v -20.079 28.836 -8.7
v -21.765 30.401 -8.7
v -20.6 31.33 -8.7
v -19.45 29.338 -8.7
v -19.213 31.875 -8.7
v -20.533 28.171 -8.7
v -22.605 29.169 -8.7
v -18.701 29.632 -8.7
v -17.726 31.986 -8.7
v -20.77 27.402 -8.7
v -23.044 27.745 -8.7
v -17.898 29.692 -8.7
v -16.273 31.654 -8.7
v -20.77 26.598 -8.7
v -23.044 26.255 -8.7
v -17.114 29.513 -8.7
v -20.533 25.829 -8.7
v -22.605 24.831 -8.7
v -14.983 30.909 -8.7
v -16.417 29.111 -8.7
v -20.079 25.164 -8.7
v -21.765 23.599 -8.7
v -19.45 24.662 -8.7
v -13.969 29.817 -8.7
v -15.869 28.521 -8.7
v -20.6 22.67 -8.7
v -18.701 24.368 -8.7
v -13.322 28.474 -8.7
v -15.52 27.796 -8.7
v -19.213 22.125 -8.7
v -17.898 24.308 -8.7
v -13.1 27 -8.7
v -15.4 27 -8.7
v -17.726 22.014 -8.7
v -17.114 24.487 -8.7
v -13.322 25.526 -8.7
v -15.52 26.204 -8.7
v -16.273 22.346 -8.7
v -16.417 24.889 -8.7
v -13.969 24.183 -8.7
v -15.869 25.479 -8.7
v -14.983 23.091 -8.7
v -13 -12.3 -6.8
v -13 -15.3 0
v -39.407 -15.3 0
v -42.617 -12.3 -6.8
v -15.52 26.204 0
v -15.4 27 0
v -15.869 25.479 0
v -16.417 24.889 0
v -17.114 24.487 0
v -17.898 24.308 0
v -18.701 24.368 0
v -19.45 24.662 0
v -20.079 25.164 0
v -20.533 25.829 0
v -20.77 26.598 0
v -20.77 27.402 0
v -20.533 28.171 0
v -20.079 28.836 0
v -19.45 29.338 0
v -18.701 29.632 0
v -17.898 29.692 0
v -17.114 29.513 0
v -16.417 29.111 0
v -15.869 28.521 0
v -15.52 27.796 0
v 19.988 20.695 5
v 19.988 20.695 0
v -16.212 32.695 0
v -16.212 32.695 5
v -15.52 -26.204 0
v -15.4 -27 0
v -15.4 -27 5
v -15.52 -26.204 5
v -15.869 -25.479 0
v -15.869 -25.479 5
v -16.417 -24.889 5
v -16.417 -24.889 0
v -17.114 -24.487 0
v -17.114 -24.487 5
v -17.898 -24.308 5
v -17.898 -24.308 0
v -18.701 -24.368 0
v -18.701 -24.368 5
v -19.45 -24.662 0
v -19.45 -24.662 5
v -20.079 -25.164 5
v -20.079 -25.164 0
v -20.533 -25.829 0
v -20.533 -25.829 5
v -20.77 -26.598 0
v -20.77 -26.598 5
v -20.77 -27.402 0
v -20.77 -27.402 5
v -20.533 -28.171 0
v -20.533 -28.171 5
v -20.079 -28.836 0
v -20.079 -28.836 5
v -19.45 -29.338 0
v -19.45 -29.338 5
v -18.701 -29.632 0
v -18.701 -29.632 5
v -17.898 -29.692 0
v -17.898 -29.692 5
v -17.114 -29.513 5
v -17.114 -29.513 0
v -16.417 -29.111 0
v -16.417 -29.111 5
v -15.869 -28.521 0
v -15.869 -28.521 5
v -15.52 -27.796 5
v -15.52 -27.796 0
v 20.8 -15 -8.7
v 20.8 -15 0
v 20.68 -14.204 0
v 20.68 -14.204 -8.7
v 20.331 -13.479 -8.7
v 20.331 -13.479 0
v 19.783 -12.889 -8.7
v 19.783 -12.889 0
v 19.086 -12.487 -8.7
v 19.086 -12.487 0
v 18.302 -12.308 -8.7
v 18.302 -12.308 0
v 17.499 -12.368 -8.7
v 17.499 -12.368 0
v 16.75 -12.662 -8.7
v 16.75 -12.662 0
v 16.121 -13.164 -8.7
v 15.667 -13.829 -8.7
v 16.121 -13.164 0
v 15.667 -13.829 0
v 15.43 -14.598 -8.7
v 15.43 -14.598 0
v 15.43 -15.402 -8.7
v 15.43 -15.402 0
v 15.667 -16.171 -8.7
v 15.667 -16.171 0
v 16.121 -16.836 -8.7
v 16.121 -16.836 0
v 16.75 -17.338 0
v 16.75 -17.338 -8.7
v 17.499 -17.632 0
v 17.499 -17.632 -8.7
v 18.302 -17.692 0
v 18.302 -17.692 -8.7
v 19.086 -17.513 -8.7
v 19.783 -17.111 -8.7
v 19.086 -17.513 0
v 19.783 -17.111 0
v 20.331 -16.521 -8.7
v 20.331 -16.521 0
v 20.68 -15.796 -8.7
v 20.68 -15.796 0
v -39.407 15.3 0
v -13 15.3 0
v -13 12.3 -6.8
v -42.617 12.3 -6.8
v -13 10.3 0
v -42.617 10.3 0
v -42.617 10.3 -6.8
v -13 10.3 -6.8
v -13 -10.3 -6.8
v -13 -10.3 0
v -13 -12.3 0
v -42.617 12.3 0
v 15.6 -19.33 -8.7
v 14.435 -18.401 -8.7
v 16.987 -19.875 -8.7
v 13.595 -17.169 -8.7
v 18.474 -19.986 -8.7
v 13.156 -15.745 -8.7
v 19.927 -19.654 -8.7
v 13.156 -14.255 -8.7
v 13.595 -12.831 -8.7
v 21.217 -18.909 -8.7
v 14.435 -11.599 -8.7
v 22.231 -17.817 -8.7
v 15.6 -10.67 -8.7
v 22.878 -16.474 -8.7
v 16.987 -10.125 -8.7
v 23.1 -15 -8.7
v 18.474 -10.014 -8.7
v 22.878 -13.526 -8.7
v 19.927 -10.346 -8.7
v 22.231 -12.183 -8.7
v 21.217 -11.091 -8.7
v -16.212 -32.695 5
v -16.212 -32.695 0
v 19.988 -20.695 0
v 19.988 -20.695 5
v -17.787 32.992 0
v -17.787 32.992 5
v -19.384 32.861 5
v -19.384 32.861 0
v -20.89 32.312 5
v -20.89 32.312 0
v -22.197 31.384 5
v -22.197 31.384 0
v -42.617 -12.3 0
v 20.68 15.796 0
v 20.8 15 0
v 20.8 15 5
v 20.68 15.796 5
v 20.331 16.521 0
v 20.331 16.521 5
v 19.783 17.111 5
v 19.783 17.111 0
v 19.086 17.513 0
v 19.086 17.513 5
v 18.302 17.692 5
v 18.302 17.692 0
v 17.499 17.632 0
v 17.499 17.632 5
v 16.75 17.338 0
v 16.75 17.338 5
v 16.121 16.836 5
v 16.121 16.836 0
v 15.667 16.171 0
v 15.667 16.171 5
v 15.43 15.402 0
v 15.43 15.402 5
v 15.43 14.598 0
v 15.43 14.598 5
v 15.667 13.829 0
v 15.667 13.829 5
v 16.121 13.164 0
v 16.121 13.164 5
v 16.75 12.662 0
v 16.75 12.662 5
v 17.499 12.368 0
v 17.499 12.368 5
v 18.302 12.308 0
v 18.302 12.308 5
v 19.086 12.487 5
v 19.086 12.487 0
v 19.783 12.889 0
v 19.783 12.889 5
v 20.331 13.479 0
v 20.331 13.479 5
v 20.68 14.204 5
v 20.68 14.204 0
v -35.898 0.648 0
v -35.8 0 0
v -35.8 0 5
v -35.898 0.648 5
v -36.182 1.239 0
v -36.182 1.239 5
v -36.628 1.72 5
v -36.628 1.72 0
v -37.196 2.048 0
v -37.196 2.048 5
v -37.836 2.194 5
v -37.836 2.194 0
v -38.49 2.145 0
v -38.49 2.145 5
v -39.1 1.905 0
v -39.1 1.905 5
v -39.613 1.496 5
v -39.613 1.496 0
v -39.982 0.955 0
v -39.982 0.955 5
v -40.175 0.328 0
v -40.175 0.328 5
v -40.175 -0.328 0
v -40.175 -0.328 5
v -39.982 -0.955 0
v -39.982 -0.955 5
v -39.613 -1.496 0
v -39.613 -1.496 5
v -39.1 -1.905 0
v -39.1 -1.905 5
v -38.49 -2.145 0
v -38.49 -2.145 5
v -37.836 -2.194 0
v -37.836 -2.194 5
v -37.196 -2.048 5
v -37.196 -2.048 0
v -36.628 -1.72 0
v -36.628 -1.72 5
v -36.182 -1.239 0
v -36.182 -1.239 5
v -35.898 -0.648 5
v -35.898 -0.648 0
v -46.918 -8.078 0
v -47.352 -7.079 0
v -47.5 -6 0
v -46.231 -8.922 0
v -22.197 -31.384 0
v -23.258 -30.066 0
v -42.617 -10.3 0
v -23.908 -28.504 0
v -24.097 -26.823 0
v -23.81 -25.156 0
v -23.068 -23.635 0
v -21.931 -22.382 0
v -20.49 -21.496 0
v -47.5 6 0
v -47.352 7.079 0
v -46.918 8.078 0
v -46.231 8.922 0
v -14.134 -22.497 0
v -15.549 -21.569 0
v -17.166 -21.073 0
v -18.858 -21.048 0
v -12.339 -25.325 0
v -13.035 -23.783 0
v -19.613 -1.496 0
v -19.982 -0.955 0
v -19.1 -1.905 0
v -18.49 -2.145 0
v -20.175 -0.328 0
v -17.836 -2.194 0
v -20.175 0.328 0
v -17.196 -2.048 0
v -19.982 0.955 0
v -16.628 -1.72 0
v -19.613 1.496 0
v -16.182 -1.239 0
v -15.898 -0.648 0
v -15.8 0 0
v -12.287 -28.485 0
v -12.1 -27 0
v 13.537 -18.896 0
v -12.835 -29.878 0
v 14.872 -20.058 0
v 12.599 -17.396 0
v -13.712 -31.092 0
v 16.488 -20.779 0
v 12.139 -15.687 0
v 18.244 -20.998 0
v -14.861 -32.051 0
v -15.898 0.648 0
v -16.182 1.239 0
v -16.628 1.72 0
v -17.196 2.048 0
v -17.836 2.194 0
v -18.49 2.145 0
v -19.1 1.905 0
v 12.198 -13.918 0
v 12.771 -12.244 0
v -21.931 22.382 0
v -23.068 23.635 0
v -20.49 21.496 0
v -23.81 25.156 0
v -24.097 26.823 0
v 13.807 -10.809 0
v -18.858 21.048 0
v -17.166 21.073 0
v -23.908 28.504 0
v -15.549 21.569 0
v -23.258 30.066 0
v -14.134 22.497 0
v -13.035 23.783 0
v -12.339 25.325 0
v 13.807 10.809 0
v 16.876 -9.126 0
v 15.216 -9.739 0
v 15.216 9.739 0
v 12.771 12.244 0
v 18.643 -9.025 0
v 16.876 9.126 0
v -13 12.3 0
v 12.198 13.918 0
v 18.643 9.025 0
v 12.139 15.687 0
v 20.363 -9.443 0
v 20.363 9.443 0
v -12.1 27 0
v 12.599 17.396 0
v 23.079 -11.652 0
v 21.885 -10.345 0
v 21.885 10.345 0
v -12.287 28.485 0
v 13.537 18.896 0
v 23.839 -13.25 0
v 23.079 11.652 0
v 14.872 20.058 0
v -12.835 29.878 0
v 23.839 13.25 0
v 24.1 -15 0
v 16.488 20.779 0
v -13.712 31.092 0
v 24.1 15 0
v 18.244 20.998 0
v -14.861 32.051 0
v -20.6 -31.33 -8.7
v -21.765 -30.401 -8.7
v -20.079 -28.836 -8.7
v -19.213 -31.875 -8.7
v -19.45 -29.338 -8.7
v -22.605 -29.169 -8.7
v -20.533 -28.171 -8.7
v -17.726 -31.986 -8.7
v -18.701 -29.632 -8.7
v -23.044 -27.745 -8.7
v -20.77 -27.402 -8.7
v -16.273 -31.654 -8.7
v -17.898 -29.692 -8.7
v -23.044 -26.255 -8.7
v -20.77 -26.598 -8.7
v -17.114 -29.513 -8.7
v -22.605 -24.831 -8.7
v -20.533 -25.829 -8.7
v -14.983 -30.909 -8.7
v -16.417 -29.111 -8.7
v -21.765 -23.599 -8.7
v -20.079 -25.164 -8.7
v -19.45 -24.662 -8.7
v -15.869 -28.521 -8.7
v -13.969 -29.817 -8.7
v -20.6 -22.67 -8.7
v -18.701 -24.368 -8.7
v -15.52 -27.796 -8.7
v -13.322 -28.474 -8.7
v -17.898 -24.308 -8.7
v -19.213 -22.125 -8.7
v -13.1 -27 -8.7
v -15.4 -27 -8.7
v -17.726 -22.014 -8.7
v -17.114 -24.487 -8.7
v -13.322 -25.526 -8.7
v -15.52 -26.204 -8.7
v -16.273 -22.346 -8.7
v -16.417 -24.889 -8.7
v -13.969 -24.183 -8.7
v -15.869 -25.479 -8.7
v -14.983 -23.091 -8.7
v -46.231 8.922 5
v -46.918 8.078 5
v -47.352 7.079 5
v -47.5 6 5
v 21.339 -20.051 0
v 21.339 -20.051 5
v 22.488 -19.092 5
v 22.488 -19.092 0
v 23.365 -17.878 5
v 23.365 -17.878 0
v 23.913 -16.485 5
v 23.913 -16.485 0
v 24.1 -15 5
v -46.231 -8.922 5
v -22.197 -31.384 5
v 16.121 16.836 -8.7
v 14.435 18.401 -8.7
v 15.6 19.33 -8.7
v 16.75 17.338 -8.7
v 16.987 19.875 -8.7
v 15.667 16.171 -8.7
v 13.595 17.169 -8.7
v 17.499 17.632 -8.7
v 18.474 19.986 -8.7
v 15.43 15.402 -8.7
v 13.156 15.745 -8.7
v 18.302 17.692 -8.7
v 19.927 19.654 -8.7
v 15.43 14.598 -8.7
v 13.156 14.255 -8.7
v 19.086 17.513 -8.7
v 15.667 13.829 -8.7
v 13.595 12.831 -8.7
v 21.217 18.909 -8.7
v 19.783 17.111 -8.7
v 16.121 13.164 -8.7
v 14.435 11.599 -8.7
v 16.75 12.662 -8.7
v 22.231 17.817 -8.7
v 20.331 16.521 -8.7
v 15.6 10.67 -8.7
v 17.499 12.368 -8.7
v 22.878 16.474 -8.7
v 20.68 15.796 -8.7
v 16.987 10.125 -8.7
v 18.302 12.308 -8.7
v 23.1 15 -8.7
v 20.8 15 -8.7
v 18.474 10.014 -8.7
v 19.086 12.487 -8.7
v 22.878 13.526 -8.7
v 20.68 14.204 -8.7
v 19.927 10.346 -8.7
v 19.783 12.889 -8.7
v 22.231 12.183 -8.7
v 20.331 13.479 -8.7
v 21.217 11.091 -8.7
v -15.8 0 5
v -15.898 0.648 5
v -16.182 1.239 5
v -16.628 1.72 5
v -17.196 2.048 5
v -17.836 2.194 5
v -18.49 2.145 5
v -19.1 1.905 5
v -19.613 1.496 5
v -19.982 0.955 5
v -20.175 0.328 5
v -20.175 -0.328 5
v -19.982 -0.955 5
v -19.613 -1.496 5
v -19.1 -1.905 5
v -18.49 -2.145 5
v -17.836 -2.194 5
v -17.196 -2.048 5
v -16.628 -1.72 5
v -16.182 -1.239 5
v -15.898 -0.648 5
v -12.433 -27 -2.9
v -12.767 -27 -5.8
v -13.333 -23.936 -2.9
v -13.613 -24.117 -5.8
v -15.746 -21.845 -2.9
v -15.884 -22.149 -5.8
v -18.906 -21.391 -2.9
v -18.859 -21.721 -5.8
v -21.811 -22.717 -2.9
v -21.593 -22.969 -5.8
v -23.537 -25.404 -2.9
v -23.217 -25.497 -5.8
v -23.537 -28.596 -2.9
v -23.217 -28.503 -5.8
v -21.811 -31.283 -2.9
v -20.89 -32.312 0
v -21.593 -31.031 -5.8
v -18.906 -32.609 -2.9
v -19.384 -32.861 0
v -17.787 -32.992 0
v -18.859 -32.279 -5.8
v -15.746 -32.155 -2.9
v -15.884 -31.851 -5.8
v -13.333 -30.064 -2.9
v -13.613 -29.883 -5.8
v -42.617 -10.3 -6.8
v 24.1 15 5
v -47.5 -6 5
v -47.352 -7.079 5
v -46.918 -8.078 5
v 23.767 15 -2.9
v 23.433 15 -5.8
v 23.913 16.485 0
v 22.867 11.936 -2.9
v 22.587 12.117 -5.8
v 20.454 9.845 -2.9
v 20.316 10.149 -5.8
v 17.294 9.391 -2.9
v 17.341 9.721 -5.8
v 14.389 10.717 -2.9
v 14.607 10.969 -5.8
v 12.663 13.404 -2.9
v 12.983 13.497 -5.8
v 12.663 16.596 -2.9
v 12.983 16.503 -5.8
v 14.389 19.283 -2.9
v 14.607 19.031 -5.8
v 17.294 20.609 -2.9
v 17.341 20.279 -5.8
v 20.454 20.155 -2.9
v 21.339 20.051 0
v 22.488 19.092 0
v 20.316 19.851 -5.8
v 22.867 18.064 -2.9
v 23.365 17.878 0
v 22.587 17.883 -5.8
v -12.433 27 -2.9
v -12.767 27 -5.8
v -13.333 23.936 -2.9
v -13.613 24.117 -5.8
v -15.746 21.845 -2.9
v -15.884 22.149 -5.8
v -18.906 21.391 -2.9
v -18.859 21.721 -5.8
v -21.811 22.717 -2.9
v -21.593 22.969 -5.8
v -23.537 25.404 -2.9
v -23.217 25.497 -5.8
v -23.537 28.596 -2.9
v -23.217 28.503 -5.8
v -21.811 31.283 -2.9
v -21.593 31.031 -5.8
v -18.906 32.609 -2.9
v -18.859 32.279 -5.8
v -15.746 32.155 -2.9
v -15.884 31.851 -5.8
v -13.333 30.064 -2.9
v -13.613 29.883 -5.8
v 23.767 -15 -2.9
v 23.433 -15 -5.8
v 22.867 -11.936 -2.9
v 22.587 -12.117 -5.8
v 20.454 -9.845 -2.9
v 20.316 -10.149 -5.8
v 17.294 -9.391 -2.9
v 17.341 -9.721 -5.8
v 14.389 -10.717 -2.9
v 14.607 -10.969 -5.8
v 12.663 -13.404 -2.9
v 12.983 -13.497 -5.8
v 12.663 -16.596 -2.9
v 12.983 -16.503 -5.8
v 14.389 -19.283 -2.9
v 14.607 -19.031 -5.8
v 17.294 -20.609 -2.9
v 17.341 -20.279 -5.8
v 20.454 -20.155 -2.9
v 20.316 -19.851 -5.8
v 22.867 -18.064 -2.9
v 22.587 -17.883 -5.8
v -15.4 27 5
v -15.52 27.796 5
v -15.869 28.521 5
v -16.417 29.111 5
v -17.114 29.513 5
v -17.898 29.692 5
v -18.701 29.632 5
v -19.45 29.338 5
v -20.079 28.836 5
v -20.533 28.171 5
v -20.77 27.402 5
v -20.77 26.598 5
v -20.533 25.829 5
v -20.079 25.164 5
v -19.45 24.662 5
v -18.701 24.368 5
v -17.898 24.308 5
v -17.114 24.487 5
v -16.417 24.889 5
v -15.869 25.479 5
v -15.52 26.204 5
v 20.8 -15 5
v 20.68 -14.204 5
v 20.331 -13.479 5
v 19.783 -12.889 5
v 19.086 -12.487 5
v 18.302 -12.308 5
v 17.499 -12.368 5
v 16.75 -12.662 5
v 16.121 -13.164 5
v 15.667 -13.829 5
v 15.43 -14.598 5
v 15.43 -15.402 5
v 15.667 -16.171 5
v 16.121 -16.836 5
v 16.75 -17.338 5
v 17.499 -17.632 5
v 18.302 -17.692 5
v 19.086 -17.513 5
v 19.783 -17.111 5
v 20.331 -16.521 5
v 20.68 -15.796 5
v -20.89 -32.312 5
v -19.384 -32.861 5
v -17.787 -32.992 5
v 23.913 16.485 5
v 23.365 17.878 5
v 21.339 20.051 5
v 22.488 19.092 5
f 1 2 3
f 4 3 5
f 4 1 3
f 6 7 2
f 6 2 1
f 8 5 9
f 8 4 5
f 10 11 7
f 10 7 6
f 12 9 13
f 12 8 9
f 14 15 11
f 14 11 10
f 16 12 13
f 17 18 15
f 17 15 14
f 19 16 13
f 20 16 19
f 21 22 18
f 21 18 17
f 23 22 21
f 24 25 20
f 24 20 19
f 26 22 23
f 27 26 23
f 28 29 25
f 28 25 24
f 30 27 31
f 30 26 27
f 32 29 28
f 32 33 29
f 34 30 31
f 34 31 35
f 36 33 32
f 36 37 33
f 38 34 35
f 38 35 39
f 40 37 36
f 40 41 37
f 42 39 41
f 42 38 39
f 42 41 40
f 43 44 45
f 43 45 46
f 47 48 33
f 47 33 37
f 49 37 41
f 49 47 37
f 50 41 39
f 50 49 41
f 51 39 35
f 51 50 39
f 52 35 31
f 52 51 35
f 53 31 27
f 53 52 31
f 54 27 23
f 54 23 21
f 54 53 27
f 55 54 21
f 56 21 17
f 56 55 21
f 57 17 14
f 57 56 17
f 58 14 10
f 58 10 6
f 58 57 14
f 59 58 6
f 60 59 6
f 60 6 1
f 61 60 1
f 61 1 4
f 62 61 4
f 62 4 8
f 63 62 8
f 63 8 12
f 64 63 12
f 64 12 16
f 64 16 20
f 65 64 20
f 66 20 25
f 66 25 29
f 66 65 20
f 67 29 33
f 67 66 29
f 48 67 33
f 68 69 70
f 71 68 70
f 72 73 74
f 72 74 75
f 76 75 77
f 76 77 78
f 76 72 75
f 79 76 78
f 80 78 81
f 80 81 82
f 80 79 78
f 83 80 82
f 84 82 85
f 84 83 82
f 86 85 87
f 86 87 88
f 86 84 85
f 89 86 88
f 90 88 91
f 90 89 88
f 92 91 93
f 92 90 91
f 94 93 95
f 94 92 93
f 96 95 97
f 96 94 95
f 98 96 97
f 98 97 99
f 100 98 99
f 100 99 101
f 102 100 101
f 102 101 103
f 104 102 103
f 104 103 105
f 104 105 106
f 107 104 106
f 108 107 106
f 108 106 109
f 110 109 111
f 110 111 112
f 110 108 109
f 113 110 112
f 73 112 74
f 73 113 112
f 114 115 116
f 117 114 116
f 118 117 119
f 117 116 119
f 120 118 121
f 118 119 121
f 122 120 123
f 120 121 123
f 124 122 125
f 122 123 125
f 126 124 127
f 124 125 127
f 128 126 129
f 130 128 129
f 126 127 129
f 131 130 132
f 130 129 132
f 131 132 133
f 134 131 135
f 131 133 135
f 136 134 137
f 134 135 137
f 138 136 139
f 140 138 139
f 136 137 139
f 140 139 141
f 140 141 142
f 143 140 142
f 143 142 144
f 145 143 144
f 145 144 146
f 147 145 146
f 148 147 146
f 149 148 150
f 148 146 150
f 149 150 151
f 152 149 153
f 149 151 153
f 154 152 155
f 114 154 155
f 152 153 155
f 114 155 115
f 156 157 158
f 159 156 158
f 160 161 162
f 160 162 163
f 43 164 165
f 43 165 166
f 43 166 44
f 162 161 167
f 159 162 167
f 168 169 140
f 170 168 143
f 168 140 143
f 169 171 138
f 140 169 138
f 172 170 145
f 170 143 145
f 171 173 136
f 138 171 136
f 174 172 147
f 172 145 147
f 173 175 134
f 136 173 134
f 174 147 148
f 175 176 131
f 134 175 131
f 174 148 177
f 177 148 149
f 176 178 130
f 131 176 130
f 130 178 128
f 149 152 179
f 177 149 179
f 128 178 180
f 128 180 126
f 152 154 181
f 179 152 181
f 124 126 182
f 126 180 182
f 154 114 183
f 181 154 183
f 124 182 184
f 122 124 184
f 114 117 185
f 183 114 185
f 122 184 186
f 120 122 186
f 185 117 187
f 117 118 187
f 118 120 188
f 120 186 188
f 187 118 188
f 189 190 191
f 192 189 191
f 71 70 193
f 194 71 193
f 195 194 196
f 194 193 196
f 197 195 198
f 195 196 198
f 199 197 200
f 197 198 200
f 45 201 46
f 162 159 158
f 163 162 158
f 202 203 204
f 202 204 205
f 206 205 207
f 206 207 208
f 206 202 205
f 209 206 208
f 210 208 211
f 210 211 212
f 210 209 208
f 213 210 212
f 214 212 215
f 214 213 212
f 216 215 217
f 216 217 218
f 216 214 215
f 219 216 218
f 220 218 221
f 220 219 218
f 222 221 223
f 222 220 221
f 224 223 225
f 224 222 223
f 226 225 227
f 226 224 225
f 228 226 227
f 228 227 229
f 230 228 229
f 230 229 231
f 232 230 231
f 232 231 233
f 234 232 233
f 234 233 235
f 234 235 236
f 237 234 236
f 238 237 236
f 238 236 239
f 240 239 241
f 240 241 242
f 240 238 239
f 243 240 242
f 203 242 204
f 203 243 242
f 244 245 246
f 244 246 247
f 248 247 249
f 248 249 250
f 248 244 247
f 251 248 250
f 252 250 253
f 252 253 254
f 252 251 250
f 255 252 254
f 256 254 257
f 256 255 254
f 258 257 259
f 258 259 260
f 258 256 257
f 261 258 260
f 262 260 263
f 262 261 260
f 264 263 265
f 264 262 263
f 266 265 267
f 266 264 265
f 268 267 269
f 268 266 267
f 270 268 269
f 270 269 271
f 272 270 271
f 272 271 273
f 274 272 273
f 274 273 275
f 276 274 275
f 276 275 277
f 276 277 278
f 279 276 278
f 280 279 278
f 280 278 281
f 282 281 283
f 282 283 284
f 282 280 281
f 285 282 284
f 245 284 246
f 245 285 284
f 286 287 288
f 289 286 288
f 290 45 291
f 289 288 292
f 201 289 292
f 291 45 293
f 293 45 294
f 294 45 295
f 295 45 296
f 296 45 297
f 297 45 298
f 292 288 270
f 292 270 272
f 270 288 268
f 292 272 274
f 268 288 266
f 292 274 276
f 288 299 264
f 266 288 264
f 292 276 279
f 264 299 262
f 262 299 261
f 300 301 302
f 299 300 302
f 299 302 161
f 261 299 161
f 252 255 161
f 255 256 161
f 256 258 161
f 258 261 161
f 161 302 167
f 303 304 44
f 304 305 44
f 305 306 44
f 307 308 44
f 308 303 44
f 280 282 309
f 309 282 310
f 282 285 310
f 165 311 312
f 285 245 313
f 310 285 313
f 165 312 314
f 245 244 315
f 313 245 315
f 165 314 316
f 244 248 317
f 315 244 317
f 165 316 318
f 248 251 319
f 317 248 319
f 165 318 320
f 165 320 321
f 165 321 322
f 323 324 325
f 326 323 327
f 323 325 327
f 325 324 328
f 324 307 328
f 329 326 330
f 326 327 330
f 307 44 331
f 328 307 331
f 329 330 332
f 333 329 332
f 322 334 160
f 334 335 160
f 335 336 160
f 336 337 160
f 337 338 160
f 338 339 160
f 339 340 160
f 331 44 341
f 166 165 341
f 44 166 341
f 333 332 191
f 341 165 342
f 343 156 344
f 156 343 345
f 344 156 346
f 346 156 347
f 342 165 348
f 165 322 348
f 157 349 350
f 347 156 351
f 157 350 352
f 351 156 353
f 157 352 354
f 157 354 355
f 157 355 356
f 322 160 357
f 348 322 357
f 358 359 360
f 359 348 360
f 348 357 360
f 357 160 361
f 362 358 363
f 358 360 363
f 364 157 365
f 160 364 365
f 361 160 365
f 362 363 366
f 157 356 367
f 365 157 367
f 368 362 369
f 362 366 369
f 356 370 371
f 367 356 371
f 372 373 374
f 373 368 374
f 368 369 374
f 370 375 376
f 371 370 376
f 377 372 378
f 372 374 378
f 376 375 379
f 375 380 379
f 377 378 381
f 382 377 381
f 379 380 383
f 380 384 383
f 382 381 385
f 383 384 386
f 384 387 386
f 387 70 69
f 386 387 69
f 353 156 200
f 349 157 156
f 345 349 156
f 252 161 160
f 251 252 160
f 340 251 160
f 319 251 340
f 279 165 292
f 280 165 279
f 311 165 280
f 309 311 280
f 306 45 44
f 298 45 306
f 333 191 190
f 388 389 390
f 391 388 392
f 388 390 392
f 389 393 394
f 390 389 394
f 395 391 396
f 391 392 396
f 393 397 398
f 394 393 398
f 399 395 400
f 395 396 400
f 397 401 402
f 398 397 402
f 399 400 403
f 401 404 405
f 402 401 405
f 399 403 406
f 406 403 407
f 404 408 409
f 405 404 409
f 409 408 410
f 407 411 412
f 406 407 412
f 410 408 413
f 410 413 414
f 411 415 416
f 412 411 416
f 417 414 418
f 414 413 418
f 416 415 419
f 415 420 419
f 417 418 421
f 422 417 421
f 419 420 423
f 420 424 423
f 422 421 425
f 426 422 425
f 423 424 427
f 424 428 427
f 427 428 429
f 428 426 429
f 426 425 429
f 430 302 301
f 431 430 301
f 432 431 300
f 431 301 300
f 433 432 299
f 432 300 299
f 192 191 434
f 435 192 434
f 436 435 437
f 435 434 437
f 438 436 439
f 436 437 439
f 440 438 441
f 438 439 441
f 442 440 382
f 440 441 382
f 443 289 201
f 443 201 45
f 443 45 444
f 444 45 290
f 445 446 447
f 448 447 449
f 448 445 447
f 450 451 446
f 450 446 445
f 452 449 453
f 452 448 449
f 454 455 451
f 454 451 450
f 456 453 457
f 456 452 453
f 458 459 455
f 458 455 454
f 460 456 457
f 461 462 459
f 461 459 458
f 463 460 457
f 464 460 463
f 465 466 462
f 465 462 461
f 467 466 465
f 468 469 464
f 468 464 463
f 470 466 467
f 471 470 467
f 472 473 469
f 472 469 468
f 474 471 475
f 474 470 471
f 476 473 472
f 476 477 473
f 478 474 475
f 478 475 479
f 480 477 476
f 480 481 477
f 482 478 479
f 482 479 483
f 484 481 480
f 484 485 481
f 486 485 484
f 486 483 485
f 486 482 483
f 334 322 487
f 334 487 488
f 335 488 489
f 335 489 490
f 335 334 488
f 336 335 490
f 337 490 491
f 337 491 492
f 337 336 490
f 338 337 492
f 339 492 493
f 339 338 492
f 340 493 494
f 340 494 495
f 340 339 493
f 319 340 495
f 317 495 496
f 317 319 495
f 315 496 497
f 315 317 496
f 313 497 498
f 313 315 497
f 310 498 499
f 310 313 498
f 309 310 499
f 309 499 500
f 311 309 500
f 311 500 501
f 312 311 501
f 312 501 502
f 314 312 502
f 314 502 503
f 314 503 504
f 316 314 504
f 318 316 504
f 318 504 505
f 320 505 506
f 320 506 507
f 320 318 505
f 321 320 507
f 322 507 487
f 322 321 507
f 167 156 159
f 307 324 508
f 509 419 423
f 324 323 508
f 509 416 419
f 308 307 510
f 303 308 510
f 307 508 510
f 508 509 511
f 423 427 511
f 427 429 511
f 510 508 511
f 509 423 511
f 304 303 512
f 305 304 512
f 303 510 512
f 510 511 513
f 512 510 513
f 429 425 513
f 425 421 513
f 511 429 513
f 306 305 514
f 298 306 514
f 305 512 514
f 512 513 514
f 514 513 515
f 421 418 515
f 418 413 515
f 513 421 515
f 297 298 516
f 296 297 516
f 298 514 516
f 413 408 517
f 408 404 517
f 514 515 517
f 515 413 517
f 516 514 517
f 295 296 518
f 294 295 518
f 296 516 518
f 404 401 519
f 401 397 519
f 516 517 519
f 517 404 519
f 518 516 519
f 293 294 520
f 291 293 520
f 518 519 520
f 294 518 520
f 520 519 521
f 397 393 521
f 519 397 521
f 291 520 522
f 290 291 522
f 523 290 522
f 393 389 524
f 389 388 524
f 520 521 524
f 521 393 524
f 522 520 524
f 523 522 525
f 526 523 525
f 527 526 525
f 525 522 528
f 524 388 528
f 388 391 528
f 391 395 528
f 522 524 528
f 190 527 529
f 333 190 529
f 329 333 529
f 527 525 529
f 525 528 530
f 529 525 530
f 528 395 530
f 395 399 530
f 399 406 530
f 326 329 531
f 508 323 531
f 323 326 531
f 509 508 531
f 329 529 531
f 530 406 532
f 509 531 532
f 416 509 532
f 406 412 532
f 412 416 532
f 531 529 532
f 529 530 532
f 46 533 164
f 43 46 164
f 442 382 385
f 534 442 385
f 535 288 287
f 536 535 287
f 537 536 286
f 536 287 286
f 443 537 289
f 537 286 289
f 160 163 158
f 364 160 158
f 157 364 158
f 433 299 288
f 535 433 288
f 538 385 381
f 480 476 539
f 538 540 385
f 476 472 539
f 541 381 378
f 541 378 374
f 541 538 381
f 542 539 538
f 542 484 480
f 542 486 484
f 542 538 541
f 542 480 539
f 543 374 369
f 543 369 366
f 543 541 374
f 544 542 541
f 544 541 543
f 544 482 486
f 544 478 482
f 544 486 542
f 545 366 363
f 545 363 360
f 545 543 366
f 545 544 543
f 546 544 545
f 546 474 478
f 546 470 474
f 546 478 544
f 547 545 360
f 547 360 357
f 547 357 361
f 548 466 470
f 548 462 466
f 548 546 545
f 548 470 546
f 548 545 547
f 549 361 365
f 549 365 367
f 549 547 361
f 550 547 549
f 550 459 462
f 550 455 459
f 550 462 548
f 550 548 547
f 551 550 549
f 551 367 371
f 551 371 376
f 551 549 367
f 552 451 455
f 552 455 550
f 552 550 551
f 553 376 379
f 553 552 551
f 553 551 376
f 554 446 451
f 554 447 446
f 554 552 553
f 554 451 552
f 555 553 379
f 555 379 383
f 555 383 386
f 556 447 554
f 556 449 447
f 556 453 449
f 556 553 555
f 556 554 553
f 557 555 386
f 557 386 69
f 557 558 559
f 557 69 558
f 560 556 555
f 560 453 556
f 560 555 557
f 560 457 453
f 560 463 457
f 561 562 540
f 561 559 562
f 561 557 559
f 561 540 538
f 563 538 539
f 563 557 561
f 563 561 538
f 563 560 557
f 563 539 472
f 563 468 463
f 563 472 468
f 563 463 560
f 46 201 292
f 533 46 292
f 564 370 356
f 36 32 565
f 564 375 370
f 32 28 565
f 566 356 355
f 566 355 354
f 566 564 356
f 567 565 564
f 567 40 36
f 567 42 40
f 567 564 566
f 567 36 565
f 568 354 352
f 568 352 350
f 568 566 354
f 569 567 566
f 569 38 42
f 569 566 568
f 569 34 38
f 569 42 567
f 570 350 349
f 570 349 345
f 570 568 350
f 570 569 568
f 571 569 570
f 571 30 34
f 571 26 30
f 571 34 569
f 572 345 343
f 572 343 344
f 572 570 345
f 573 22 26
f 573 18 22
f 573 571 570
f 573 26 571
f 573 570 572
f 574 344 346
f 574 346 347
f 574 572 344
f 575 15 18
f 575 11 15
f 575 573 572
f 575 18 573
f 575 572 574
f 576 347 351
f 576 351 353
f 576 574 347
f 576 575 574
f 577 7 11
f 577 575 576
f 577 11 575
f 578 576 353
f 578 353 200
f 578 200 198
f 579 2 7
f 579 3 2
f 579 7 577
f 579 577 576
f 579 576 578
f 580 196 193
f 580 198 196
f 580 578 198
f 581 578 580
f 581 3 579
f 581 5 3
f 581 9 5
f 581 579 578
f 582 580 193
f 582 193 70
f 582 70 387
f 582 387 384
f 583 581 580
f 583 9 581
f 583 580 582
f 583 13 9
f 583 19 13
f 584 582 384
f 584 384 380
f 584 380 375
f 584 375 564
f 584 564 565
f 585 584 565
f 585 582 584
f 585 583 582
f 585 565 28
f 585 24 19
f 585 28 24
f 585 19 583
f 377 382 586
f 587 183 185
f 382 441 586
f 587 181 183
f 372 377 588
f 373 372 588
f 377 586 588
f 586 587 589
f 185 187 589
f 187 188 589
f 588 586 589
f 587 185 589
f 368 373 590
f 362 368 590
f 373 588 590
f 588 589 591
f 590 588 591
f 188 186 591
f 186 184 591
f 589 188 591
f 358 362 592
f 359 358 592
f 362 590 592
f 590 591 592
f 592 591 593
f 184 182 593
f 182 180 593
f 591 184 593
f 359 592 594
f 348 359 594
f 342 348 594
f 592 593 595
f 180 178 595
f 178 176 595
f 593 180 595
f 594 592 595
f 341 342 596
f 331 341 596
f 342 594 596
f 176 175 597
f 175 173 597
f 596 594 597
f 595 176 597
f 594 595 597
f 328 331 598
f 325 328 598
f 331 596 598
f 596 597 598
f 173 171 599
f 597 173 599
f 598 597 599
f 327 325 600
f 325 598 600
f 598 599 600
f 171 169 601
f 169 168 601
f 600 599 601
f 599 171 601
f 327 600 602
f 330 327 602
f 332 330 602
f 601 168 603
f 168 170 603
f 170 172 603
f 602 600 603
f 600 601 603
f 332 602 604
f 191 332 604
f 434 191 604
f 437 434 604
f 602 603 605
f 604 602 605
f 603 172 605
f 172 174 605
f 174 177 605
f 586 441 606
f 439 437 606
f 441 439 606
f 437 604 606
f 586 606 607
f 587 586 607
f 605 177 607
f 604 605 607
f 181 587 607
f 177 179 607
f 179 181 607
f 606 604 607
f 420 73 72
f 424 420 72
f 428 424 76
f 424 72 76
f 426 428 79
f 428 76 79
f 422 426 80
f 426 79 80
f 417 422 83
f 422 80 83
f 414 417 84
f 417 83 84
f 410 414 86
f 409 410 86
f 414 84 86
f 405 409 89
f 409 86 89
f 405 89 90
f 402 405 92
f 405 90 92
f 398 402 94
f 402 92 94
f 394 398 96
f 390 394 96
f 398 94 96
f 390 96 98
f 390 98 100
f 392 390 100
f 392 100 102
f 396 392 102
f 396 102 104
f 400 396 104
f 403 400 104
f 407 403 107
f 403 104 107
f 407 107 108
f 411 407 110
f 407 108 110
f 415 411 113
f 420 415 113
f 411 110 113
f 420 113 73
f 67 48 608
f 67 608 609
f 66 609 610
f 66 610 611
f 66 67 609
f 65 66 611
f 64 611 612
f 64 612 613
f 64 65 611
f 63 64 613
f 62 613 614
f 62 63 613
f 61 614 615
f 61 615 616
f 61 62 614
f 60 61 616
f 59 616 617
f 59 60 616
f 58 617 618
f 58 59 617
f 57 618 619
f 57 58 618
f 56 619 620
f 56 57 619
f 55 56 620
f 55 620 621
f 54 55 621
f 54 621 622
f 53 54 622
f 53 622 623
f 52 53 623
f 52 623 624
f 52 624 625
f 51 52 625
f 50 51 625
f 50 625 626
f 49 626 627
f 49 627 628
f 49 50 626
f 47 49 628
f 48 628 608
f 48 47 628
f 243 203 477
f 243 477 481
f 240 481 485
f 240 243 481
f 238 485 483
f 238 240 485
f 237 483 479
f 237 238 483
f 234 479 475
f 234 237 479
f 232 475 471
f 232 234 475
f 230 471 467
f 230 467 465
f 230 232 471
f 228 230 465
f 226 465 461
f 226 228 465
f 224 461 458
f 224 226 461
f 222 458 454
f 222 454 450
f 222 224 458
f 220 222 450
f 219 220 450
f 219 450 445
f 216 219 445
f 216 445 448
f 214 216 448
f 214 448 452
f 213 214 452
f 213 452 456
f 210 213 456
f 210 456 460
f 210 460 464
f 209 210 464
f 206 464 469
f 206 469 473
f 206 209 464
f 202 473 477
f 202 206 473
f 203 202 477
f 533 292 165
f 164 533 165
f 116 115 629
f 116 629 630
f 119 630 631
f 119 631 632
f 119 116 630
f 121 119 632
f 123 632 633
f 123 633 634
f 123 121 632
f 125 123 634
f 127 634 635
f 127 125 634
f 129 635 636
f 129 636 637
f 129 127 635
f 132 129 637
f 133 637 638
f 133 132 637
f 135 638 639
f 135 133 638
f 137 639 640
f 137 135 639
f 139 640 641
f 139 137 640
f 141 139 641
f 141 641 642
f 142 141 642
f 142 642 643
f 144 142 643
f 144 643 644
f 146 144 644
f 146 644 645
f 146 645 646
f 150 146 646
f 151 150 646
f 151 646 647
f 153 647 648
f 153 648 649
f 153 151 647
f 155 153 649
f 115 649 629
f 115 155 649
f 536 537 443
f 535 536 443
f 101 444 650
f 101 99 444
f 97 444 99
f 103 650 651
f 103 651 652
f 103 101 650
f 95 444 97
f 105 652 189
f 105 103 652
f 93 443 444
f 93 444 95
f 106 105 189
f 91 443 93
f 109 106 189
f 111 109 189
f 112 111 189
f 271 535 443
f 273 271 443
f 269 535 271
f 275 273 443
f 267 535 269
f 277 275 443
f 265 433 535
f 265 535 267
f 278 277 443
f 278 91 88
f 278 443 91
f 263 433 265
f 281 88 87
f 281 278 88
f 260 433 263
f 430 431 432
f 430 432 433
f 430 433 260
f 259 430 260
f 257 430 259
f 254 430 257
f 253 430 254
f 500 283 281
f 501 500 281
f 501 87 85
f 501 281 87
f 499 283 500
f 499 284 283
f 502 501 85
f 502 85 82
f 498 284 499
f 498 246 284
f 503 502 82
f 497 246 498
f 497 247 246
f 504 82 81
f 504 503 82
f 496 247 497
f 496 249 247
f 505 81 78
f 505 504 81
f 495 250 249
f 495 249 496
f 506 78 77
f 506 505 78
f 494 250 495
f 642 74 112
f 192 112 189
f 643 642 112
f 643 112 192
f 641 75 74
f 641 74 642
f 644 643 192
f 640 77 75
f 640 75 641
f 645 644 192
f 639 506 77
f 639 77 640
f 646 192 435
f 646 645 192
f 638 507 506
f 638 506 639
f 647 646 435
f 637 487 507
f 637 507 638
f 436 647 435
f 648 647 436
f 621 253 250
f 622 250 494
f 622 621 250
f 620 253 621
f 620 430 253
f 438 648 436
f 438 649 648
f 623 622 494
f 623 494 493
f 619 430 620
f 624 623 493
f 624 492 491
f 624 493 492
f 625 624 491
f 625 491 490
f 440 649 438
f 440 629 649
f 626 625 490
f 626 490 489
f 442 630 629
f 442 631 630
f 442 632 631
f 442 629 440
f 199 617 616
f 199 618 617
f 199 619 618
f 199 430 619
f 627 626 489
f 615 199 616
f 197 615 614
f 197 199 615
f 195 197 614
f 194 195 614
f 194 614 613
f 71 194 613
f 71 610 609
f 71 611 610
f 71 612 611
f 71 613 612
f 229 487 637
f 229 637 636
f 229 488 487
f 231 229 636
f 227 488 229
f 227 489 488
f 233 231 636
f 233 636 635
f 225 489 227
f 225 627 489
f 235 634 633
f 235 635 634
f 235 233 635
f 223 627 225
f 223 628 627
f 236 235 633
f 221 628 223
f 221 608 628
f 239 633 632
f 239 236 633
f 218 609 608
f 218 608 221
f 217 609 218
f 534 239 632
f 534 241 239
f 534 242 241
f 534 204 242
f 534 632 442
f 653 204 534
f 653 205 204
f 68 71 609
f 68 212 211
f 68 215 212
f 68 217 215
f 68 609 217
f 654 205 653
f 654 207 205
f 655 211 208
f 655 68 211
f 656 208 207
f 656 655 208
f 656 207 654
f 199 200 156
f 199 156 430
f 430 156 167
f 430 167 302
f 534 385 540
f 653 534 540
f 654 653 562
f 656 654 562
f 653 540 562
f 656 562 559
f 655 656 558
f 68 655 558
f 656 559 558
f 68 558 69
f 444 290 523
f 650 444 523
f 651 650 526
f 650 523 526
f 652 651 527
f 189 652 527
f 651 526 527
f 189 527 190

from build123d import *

# Parameters (mm, degrees)
SKETCH_1_R       = 2.7
SKETCH_1_R_2     = 2.2
EXTRUDE_1_DEPTH  = 5
SKETCH_1_4_W     = 29.617054823
SKETCH_1_4_H     = 2
EXTRUDE_2_DEPTH  = 6.8
CHAMFER_1_SIZE   = 3
CHAMFER_1_SIZE_2 = 6.8
CHAMFER_2_SIZE   = 3
CHAMFER_2_SIZE_2 = 6.8


with BuildPart() as part:
    # 草图1 → 凸台-拉伸1 (new body)
    with BuildSketch(Plane.XY):
        with BuildLine():
            Line((-22.196745644, 31.383682827), (-46.231163763, 8.922455218))
            ThreePointArc((-46.231163763, 8.922455218), (-47.169104458, 7.593007368), (-47.5, 6))
            Line((-47.5, 6), (-47.5, -6))
            ThreePointArc((-47.5, -6), (-47.169104458, -7.593007368), (-46.231163763, -8.922455218))
            Line((-46.231163763, -8.922455218), (-22.196745644, -31.383682827))
            ThreePointArc((-22.196745644, -31.383682827), (-19.384432728, -32.860907145), (-16.212075635, -32.695238502))
            Line((-16.212075635, -32.695238502), (19.987924365, -20.695238502))
            ThreePointArc((19.987924365, -20.695238502), (22.964542434, -18.512296529), (24.1, -15))
            Line((24.1, -15), (24.1, 15))
            ThreePointArc((24.1, 15), (22.964542434, 18.512296529), (19.987924365, 20.695238502))
            Line((19.987924365, 20.695238502), (-16.212075635, 32.695238502))
            ThreePointArc((-16.212075635, 32.695238502), (-19.384432728, 32.860907145), (-22.196745644, 31.383682827))
        make_face()
        with Locations((18.1, -15)):
            Circle(SKETCH_1_R, mode=Mode.SUBTRACT)
        with Locations((-38, 0)):
            Circle(SKETCH_1_R_2, mode=Mode.SUBTRACT)
        with Locations((-18, 0)):
            Circle(SKETCH_1_R_2, mode=Mode.SUBTRACT)
        with Locations((-18.1, 27)):
            Circle(SKETCH_1_R, mode=Mode.SUBTRACT)
        with Locations((18.1, 15)):
            Circle(SKETCH_1_R, mode=Mode.SUBTRACT)
        with Locations((-18.1, -27)):
            Circle(SKETCH_1_R, mode=Mode.SUBTRACT)
    extrude(amount=EXTRUDE_1_DEPTH)

    # 草图4 → 旋转1 (revolve)
    with BuildSketch(Plane(origin=(6.272104728, 18.920849262, 0), x_dir=(-0.9492064169502825, 0.3146540608674969, 0), z_dir=(-0.3146540608674969, -0.9492064169502825, 0)), mode=Mode.PRIVATE) as revolve_1_sk:
        Polygon((-6.460825234, 0), (-7.460825234, 8.7), (-9.760825234, 8.7), (-9.760825234, 0), align=None)
    revolve_1 = revolve(revolve_1_sk.sketch.rotate(Axis((18.1, 15, 4.45283877), (0, 0, -1)), 161.660068966), axis=Axis((18.1, 15, 4.45283877), (0, 0, -1)))

    # 草图4<3> → 旋转2 (revolve)
    with BuildSketch(Plane(origin=(6.272104728, 18.920849262, 0), x_dir=(-0.9492064169502825, 0.3146540608674969, 0), z_dir=(-0.3146540608674969, -0.9492064169502825, 0)), mode=Mode.PRIVATE) as revolve_2_sk:
        Polygon((30.67629579, 8.7), (28.37629579, 8.7), (28.37629579, 0), (31.67629579, 0), align=None)
    revolve_2 = revolve(revolve_2_sk.sketch.rotate(Axis((-18.1, 27, 0), (0, 0, -1)), 161.660068966), axis=Axis((-18.1, 27, 0), (0, 0, -1)))

    # 镜向1: 旋转1, 旋转2 across plane
    add(revolve_1.mirror(Plane.ZX))
    add(revolve_2.mirror(Plane.ZX))

    # 草图1<4> → 凸台-拉伸2 (add)
    with BuildSketch(Plane.XY):
        with Locations((-27.808527412, 11.3)):
            Rectangle(SKETCH_1_4_W, SKETCH_1_4_H)
        with Locations((-27.808527412, -11.3)):
            Rectangle(SKETCH_1_4_W, SKETCH_1_4_H)
    extrude(amount=-EXTRUDE_2_DEPTH)

    # 倒角1
    # the kernel refuses this chamfer: 6.8, 3 mm, written as the material it adds along each edge
    with BuildSketch(Plane(origin=(-13, 12.3, 0), x_dir=(0, 0.9968133817371192, 0.07976892872421078), z_dir=(-1, 0, 0))) as chamfer_1_piece_1_section:
        Polygon((CHAMFER_1_SIZE * 0.996813381737, CHAMFER_1_SIZE * 0.0797689287242), (-CHAMFER_1_SIZE_2 * 0.0797689287242, CHAMFER_1_SIZE_2 * 0.996813381737), (0, 0), align=None)
    chamfer_1_piece_1 = extrude(amount=29.617054823, mode=Mode.PRIVATE)
    chamfer_1_piece_1 = split(chamfer_1_piece_1, bisect_by=Plane(origin=(-33.986119971, 20.365990665, -2.314362064), z_dir=(0.6827909407070696, -0.730613804474262, 0)), keep=Keep.TOP, mode=Mode.PRIVATE)
    chamfer_1_piece_1 = split(chamfer_1_piece_1, bisect_by=Plane(origin=(-27.310795563, 13.223124714, -6.8), z_dir=(0, 0, 1)), keep=Keep.TOP, mode=Mode.PRIVATE)
    add(chamfer_1_piece_1)

    # 倒角2
    # the kernel refuses this chamfer: 6.8, 3 mm, written as the material it adds along each edge
    with BuildSketch(Plane(origin=(-42.617054823, -12.3, 0), x_dir=(0, -0.9968133817371192, 0.07976892872421078), z_dir=(1, 0, 0))) as chamfer_2_piece_1_section:
        Polygon((CHAMFER_2_SIZE * 0.996813381737, CHAMFER_2_SIZE * 0.0797689287242), (-CHAMFER_2_SIZE_2 * 0.0797689287242, CHAMFER_2_SIZE_2 * 0.996813381737), (0, 0), align=None)
    chamfer_2_piece_1 = extrude(amount=29.617054823, mode=Mode.PRIVATE)
    chamfer_2_piece_1 = split(chamfer_2_piece_1, bisect_by=Plane(origin=(-33.986119971, -20.365990665, -2.314362064), z_dir=(0.6827909407070697, 0.7306138044742619, 0)), keep=Keep.TOP, mode=Mode.PRIVATE)
    chamfer_2_piece_1 = split(chamfer_2_piece_1, bisect_by=Plane(origin=(-27.310795563, -13.223124714, -6.8), z_dir=(0, 0, 1)), keep=Keep.TOP, mode=Mode.PRIVATE)
    add(chamfer_2_piece_1)


solid = part.part
